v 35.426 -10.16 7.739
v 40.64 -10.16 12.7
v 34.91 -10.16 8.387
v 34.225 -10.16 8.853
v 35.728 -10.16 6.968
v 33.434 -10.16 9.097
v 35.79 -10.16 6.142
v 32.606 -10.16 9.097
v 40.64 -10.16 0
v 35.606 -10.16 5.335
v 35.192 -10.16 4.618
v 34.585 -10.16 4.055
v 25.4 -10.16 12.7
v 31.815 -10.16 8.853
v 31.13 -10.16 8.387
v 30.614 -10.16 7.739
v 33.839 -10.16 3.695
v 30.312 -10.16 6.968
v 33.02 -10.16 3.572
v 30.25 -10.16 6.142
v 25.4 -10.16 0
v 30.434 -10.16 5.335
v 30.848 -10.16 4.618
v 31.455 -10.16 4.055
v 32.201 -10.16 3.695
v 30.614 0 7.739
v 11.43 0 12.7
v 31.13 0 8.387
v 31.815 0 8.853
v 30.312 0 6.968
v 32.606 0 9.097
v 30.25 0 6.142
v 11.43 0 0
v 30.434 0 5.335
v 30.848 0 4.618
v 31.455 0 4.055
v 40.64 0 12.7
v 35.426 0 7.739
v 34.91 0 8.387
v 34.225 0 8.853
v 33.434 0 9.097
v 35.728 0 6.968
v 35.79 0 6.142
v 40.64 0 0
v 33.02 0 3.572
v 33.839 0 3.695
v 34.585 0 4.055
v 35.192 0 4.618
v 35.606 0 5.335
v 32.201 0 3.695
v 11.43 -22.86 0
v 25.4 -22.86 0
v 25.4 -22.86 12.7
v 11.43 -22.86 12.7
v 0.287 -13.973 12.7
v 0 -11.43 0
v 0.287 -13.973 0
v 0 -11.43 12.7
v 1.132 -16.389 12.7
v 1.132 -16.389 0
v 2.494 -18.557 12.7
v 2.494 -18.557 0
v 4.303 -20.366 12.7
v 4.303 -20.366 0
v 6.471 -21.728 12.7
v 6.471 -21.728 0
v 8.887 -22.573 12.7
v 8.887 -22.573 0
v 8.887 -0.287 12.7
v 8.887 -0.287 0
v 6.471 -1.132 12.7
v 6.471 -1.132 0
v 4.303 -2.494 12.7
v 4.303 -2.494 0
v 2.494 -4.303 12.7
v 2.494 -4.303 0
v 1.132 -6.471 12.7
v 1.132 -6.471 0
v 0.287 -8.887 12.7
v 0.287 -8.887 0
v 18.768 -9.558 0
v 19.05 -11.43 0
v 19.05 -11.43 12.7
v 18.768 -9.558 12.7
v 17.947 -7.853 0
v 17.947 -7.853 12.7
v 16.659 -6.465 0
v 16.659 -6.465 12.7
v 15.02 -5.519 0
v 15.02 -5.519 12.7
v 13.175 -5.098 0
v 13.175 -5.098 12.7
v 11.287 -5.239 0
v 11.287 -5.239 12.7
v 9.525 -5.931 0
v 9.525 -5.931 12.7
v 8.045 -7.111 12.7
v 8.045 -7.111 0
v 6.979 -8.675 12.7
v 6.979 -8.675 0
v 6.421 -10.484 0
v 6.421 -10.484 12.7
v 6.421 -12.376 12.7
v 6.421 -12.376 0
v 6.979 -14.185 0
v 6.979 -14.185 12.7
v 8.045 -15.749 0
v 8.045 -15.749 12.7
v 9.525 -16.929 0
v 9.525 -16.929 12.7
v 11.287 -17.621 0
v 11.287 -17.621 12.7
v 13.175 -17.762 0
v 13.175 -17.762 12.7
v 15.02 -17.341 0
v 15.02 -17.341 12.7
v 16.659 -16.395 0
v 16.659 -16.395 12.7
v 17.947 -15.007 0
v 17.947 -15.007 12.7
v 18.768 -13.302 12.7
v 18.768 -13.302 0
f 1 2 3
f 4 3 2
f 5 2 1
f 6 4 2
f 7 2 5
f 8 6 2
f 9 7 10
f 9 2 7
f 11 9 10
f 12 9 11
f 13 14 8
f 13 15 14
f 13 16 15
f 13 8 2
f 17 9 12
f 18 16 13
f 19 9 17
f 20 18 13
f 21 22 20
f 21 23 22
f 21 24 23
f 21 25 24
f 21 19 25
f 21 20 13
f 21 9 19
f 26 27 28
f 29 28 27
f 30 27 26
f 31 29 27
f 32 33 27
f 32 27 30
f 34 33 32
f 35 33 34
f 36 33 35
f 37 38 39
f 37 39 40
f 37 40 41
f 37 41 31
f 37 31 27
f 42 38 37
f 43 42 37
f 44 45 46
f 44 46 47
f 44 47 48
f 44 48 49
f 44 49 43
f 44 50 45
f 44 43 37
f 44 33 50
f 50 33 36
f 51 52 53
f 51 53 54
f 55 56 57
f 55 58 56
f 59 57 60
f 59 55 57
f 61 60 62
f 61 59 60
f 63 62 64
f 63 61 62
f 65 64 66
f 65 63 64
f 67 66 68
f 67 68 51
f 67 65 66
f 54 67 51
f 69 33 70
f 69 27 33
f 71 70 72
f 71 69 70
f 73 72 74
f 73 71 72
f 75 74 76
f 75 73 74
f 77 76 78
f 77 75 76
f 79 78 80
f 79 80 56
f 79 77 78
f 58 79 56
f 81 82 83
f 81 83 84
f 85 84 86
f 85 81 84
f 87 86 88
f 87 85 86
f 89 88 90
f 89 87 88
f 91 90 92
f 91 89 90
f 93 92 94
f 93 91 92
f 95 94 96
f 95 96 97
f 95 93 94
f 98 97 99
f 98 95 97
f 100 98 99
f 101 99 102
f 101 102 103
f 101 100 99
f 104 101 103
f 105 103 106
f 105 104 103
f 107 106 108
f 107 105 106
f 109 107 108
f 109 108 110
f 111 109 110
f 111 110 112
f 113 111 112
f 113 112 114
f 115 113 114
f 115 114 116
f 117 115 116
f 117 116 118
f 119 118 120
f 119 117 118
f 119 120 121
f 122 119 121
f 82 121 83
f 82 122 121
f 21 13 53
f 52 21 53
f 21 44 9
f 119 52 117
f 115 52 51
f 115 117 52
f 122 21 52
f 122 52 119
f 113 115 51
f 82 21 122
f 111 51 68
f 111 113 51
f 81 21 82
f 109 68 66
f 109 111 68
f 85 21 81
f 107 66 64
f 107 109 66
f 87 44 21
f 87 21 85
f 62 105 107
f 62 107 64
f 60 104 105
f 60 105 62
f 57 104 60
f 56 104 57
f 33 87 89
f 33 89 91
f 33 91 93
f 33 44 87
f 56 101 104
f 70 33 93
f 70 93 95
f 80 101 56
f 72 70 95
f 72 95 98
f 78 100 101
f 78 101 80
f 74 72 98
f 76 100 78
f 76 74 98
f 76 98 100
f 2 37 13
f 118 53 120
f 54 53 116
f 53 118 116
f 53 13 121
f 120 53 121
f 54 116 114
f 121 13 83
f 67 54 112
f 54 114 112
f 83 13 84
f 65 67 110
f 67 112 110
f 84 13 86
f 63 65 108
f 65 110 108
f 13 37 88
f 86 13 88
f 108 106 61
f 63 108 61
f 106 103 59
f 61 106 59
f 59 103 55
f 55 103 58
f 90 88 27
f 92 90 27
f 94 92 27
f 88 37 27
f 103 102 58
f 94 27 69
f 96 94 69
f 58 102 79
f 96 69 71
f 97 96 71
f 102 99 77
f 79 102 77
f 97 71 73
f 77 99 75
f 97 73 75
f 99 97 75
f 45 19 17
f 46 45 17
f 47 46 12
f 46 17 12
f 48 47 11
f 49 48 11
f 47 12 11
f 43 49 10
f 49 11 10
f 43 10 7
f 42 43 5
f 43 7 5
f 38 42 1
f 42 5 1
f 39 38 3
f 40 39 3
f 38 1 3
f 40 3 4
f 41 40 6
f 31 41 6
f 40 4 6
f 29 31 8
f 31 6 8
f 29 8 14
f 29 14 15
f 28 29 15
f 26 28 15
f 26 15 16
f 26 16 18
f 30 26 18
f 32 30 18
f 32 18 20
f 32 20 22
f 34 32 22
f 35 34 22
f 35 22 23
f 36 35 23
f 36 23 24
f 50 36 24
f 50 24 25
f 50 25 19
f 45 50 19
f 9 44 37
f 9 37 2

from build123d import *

# Parameters (mm, degrees)
SKETCH2_R                           = 6.35
BOSS_EXTRUDE1_DEPTH                 = 12.7
FILLET3_R                           = 11.43
F_7_32_0_21875_DIAMETER_HOLE1_D     = 5.55625
F_7_32_0_21875_DIAMETER_HOLE1_DEPTH = 36.430734093
F_7_32_0_21875_DIAMETER_HOLE1_TIP   = 1.669265907


with BuildPart() as part:
    # Sketch2 → Boss-Extrude1 (new body)
    with BuildSketch(Plane.XY):
        Polygon((0, 0), (40.64, 0), (40.64, -10.16), (25.4, -10.16), (25.4, -22.86), (0, -22.86), align=None)
        with Locations((12.7, -11.43)):
            Circle(SKETCH2_R, mode=Mode.SUBTRACT)
    extrude(amount=BOSS_EXTRUDE1_DEPTH)

    # Fillet3
    fillet3_edges = [part.edges().sort_by_distance(p)[0] for p in [
        (0, -22.86, 6.35),
        (0, 0, 6.35),
    ]]
    fillet(fillet3_edges, radius=FILLET3_R - 0.0001)  # a hair under: the kernel refuses the full size

    # 7/32 (0.21875) Diameter Hole1
    with Locations(Plane(origin=(33.02, 0, 6.35), x_dir=(0, 0, 1), z_dir=(0, 1, 0))):
        with Locations((0, 0)):
            Hole(F_7_32_0_21875_DIAMETER_HOLE1_D / 2, depth=F_7_32_0_21875_DIAMETER_HOLE1_DEPTH)
            with Locations((0, 0, -(F_7_32_0_21875_DIAMETER_HOLE1_DEPTH + F_7_32_0_21875_DIAMETER_HOLE1_TIP / 2))):  # 118° drill point
                Cone(0, F_7_32_0_21875_DIAMETER_HOLE1_D / 2, F_7_32_0_21875_DIAMETER_HOLE1_TIP, mode=Mode.SUBTRACT)


solid = part.part
